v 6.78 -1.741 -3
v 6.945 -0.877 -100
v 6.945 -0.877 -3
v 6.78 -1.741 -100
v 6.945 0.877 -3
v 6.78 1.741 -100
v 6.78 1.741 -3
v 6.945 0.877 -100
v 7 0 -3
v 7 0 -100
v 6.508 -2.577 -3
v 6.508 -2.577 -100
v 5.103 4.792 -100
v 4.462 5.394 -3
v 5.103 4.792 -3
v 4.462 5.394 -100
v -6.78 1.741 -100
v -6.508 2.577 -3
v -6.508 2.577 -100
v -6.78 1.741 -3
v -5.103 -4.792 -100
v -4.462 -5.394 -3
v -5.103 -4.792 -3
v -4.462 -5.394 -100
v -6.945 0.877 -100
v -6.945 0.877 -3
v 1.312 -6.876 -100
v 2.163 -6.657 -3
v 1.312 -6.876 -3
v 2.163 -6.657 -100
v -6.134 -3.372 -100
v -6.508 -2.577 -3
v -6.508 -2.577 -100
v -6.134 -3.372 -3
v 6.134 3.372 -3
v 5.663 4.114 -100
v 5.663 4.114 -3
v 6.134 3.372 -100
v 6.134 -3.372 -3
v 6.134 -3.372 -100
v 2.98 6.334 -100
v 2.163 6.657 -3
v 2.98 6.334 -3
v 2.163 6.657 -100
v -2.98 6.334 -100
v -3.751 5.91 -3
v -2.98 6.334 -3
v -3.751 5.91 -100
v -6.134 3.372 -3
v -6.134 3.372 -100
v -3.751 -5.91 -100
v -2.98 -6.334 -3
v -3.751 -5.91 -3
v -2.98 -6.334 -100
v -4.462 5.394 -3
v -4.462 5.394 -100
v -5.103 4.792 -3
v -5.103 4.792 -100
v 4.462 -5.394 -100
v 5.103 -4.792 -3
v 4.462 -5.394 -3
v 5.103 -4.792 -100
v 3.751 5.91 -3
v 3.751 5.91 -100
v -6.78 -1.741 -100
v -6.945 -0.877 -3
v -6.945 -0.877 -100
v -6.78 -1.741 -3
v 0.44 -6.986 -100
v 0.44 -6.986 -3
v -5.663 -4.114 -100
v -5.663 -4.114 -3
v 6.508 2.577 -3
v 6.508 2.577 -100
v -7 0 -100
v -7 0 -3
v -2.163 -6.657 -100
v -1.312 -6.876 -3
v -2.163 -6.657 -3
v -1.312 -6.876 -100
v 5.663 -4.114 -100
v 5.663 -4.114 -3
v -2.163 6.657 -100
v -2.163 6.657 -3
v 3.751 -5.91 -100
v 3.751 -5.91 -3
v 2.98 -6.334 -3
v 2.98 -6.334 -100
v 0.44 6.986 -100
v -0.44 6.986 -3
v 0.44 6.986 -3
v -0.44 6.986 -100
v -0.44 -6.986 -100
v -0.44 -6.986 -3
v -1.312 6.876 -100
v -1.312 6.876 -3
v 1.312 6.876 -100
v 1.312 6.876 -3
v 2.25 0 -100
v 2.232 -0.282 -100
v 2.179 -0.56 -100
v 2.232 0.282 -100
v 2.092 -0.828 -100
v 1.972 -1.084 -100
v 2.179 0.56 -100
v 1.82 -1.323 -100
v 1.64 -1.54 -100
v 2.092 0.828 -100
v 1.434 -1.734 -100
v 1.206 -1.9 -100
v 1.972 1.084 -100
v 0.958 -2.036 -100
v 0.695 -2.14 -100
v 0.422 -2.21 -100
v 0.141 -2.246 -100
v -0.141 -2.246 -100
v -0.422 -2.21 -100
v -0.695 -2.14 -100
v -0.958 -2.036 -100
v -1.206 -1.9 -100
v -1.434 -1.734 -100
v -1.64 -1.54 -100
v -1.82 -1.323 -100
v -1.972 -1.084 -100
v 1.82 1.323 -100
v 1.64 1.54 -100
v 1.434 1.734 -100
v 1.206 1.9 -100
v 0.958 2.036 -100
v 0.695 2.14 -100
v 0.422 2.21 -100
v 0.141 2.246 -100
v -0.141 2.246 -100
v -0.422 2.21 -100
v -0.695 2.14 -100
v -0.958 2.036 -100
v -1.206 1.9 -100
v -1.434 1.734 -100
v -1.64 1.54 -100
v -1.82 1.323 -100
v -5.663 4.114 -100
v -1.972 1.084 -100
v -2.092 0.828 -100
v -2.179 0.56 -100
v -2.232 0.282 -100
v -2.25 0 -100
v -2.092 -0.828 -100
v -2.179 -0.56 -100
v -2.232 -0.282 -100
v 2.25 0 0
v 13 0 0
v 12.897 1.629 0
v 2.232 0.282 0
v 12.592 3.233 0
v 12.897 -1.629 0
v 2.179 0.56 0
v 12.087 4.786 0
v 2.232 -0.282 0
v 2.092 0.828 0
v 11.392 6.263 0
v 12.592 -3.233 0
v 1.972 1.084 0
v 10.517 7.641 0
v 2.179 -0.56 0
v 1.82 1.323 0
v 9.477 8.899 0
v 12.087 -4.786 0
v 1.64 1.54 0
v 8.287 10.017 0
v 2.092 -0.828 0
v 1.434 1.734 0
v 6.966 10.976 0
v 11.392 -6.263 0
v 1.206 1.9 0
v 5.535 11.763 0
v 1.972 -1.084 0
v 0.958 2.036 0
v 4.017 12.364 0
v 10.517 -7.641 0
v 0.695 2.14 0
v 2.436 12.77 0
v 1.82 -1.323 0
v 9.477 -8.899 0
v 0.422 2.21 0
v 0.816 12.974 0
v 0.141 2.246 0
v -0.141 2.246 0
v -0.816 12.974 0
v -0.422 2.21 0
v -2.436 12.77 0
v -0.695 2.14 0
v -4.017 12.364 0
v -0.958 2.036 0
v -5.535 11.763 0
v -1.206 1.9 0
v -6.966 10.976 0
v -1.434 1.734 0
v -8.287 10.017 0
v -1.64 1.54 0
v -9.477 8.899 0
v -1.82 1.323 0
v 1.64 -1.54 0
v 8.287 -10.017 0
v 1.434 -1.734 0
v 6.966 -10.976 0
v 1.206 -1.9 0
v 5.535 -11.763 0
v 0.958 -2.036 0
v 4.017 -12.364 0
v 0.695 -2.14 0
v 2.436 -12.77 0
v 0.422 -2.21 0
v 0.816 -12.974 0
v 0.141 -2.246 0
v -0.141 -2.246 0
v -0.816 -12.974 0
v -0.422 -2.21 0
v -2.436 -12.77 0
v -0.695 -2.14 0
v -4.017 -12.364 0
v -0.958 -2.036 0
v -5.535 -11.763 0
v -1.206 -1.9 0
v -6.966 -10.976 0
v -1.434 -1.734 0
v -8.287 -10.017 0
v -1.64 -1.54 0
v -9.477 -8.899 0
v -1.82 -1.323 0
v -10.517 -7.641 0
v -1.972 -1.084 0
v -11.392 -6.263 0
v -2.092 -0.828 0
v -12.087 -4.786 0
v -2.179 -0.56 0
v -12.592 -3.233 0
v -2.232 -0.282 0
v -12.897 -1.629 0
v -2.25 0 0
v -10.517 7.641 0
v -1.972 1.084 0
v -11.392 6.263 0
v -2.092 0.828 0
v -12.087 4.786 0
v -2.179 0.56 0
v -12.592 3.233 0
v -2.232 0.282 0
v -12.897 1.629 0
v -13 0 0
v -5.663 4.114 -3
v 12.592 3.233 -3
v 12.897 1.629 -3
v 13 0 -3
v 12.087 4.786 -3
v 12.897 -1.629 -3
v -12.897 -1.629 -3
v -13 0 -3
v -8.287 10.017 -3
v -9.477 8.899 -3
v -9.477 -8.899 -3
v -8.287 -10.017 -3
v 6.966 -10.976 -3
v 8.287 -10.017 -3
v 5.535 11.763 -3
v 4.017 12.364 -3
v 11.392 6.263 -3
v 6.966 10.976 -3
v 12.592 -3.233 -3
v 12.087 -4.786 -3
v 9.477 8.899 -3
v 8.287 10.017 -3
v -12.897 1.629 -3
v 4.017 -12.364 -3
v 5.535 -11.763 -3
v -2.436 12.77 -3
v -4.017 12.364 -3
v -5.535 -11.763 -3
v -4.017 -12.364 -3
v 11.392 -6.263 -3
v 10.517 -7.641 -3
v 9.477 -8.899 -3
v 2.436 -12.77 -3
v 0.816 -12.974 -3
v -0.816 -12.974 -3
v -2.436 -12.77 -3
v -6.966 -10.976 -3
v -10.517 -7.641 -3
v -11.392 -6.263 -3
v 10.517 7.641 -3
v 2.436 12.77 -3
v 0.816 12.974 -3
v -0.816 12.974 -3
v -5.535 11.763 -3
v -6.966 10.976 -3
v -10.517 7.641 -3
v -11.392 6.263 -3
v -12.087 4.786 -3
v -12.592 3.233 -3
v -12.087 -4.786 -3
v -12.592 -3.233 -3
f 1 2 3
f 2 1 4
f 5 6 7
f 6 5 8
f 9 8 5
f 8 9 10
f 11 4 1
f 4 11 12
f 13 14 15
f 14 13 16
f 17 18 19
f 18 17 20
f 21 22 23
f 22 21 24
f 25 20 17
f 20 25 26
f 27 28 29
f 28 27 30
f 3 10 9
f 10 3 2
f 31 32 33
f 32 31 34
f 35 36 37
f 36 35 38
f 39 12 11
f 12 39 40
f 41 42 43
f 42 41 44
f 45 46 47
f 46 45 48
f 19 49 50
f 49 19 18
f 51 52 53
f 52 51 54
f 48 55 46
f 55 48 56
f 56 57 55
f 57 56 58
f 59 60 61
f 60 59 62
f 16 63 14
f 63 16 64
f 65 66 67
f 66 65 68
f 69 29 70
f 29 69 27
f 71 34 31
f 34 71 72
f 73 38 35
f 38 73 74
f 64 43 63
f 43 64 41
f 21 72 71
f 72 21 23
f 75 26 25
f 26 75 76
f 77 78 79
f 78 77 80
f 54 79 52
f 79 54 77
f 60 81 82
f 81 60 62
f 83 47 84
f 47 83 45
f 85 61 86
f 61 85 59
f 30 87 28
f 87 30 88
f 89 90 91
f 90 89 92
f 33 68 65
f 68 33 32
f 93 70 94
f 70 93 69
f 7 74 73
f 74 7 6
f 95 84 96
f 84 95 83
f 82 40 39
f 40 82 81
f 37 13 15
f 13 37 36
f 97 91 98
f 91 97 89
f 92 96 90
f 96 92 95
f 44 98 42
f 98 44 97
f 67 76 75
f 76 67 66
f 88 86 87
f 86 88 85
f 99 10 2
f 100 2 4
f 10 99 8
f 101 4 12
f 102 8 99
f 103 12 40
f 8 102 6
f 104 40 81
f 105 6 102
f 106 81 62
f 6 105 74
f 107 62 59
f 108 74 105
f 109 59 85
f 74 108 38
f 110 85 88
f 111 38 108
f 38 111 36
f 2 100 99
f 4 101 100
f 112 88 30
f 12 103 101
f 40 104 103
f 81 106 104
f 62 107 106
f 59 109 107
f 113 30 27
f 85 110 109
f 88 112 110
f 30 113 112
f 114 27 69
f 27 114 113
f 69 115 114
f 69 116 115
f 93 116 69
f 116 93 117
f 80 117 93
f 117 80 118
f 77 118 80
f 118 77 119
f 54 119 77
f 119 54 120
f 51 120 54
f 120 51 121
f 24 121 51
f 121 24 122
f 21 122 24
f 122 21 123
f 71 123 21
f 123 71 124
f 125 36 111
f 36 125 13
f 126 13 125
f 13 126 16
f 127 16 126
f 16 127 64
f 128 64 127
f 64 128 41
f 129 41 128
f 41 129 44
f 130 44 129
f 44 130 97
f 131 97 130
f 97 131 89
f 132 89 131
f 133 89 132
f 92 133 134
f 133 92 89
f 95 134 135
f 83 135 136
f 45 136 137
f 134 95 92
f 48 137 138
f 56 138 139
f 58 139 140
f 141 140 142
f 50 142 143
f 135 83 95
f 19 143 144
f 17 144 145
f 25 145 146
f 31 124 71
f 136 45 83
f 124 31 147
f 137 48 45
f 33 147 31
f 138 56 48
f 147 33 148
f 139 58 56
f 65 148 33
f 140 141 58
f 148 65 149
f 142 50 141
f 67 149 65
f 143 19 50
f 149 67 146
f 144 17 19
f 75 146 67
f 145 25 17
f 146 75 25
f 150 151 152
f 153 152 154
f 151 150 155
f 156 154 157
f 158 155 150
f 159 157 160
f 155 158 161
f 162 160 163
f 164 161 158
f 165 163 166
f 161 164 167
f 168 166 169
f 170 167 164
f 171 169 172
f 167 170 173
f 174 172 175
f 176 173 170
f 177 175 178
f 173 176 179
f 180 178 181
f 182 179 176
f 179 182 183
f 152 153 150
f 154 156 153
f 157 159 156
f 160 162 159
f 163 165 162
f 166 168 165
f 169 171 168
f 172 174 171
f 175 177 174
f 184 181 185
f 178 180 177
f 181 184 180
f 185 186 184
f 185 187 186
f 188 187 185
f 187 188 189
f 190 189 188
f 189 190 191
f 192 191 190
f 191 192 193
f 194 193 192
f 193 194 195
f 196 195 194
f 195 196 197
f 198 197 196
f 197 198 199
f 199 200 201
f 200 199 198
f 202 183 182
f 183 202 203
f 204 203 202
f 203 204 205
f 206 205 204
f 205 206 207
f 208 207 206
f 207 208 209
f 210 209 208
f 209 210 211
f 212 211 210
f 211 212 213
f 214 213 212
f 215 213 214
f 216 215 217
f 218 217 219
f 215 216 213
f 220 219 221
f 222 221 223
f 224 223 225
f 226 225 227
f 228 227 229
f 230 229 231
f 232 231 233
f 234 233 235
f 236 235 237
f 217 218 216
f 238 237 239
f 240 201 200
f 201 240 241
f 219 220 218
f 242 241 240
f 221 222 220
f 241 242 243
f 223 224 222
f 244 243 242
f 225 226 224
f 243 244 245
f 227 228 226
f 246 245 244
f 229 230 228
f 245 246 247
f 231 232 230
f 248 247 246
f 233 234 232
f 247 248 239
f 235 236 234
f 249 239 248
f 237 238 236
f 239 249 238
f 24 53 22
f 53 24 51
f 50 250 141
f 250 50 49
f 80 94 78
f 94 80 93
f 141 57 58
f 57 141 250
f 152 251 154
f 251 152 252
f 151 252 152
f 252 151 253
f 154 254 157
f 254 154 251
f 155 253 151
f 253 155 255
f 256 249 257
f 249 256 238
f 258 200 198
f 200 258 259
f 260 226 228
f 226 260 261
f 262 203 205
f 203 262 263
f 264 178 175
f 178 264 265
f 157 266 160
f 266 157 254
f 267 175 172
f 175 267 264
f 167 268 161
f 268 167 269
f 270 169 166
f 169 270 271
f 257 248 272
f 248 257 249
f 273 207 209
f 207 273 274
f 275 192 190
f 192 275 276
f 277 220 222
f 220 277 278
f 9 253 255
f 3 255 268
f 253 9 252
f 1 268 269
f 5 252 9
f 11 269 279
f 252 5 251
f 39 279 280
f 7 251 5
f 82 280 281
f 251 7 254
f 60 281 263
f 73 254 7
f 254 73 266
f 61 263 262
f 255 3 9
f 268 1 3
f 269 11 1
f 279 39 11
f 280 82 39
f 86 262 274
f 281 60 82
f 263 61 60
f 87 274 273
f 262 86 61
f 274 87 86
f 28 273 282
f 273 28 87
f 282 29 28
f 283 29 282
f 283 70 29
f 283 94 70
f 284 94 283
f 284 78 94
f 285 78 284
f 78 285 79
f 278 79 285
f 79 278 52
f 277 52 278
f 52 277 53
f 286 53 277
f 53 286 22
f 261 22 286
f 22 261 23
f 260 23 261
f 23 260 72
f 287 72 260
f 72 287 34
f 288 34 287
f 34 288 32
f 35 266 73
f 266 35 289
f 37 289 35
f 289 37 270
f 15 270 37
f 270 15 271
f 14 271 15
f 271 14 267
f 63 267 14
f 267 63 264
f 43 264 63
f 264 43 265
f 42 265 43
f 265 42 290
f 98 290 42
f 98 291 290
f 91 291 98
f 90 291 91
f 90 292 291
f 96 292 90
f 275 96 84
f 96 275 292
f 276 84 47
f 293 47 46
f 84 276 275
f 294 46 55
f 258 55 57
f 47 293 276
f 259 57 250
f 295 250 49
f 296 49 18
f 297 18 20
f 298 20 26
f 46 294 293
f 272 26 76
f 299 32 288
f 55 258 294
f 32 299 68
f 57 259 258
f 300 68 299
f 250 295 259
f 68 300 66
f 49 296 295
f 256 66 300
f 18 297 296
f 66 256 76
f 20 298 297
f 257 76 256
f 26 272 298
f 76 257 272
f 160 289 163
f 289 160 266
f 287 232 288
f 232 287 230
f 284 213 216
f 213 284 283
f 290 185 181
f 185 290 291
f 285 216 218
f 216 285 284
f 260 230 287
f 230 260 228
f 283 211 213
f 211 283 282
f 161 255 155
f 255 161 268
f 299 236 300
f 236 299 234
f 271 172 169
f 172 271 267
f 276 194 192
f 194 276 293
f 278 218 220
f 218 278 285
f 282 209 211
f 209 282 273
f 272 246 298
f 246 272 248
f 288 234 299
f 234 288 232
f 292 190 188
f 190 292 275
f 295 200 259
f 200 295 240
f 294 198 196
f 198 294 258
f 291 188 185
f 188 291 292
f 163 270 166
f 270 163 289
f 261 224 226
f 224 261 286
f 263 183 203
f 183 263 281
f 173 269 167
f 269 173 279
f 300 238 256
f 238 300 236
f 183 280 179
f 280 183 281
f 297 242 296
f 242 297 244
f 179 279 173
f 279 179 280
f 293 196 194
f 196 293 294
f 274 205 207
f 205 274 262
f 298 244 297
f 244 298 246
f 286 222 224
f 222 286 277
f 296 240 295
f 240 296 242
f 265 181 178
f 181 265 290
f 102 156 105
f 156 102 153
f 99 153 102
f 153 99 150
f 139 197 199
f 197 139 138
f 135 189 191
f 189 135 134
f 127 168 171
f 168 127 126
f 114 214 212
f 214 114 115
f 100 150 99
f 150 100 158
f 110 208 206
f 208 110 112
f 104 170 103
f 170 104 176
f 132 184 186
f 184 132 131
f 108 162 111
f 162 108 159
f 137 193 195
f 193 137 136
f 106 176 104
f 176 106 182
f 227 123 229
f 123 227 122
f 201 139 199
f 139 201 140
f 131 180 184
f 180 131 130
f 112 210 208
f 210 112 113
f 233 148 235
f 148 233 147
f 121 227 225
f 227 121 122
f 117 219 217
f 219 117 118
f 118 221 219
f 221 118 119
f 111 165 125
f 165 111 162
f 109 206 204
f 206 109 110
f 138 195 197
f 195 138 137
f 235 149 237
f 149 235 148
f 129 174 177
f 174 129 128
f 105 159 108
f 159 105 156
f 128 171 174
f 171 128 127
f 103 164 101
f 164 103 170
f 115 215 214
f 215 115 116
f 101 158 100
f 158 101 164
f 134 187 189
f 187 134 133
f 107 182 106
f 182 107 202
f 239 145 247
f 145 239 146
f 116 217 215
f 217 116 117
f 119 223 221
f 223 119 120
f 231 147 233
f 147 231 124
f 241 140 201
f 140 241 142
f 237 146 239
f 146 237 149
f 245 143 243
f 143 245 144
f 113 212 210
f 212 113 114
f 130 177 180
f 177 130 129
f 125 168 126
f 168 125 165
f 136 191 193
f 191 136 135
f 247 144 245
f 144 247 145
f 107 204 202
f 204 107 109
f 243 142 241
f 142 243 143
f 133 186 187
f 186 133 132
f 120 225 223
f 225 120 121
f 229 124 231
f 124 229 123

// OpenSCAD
$fn = 50;


difference() {
	union() {
		translate(v = [0, 0, -100.0000000000]) {
			cylinder(h = 100, r = 7.0000000000);
		}
		translate(v = [0, 0, -3.0000000000]) {
			cylinder(h = 3, r = 13.0000000000);
		}
	}
	union() {
		#translate(v = [0, 0, -100]) {
			cylinder(h = 100, r = 2.2500000000);
		}
	}
}
